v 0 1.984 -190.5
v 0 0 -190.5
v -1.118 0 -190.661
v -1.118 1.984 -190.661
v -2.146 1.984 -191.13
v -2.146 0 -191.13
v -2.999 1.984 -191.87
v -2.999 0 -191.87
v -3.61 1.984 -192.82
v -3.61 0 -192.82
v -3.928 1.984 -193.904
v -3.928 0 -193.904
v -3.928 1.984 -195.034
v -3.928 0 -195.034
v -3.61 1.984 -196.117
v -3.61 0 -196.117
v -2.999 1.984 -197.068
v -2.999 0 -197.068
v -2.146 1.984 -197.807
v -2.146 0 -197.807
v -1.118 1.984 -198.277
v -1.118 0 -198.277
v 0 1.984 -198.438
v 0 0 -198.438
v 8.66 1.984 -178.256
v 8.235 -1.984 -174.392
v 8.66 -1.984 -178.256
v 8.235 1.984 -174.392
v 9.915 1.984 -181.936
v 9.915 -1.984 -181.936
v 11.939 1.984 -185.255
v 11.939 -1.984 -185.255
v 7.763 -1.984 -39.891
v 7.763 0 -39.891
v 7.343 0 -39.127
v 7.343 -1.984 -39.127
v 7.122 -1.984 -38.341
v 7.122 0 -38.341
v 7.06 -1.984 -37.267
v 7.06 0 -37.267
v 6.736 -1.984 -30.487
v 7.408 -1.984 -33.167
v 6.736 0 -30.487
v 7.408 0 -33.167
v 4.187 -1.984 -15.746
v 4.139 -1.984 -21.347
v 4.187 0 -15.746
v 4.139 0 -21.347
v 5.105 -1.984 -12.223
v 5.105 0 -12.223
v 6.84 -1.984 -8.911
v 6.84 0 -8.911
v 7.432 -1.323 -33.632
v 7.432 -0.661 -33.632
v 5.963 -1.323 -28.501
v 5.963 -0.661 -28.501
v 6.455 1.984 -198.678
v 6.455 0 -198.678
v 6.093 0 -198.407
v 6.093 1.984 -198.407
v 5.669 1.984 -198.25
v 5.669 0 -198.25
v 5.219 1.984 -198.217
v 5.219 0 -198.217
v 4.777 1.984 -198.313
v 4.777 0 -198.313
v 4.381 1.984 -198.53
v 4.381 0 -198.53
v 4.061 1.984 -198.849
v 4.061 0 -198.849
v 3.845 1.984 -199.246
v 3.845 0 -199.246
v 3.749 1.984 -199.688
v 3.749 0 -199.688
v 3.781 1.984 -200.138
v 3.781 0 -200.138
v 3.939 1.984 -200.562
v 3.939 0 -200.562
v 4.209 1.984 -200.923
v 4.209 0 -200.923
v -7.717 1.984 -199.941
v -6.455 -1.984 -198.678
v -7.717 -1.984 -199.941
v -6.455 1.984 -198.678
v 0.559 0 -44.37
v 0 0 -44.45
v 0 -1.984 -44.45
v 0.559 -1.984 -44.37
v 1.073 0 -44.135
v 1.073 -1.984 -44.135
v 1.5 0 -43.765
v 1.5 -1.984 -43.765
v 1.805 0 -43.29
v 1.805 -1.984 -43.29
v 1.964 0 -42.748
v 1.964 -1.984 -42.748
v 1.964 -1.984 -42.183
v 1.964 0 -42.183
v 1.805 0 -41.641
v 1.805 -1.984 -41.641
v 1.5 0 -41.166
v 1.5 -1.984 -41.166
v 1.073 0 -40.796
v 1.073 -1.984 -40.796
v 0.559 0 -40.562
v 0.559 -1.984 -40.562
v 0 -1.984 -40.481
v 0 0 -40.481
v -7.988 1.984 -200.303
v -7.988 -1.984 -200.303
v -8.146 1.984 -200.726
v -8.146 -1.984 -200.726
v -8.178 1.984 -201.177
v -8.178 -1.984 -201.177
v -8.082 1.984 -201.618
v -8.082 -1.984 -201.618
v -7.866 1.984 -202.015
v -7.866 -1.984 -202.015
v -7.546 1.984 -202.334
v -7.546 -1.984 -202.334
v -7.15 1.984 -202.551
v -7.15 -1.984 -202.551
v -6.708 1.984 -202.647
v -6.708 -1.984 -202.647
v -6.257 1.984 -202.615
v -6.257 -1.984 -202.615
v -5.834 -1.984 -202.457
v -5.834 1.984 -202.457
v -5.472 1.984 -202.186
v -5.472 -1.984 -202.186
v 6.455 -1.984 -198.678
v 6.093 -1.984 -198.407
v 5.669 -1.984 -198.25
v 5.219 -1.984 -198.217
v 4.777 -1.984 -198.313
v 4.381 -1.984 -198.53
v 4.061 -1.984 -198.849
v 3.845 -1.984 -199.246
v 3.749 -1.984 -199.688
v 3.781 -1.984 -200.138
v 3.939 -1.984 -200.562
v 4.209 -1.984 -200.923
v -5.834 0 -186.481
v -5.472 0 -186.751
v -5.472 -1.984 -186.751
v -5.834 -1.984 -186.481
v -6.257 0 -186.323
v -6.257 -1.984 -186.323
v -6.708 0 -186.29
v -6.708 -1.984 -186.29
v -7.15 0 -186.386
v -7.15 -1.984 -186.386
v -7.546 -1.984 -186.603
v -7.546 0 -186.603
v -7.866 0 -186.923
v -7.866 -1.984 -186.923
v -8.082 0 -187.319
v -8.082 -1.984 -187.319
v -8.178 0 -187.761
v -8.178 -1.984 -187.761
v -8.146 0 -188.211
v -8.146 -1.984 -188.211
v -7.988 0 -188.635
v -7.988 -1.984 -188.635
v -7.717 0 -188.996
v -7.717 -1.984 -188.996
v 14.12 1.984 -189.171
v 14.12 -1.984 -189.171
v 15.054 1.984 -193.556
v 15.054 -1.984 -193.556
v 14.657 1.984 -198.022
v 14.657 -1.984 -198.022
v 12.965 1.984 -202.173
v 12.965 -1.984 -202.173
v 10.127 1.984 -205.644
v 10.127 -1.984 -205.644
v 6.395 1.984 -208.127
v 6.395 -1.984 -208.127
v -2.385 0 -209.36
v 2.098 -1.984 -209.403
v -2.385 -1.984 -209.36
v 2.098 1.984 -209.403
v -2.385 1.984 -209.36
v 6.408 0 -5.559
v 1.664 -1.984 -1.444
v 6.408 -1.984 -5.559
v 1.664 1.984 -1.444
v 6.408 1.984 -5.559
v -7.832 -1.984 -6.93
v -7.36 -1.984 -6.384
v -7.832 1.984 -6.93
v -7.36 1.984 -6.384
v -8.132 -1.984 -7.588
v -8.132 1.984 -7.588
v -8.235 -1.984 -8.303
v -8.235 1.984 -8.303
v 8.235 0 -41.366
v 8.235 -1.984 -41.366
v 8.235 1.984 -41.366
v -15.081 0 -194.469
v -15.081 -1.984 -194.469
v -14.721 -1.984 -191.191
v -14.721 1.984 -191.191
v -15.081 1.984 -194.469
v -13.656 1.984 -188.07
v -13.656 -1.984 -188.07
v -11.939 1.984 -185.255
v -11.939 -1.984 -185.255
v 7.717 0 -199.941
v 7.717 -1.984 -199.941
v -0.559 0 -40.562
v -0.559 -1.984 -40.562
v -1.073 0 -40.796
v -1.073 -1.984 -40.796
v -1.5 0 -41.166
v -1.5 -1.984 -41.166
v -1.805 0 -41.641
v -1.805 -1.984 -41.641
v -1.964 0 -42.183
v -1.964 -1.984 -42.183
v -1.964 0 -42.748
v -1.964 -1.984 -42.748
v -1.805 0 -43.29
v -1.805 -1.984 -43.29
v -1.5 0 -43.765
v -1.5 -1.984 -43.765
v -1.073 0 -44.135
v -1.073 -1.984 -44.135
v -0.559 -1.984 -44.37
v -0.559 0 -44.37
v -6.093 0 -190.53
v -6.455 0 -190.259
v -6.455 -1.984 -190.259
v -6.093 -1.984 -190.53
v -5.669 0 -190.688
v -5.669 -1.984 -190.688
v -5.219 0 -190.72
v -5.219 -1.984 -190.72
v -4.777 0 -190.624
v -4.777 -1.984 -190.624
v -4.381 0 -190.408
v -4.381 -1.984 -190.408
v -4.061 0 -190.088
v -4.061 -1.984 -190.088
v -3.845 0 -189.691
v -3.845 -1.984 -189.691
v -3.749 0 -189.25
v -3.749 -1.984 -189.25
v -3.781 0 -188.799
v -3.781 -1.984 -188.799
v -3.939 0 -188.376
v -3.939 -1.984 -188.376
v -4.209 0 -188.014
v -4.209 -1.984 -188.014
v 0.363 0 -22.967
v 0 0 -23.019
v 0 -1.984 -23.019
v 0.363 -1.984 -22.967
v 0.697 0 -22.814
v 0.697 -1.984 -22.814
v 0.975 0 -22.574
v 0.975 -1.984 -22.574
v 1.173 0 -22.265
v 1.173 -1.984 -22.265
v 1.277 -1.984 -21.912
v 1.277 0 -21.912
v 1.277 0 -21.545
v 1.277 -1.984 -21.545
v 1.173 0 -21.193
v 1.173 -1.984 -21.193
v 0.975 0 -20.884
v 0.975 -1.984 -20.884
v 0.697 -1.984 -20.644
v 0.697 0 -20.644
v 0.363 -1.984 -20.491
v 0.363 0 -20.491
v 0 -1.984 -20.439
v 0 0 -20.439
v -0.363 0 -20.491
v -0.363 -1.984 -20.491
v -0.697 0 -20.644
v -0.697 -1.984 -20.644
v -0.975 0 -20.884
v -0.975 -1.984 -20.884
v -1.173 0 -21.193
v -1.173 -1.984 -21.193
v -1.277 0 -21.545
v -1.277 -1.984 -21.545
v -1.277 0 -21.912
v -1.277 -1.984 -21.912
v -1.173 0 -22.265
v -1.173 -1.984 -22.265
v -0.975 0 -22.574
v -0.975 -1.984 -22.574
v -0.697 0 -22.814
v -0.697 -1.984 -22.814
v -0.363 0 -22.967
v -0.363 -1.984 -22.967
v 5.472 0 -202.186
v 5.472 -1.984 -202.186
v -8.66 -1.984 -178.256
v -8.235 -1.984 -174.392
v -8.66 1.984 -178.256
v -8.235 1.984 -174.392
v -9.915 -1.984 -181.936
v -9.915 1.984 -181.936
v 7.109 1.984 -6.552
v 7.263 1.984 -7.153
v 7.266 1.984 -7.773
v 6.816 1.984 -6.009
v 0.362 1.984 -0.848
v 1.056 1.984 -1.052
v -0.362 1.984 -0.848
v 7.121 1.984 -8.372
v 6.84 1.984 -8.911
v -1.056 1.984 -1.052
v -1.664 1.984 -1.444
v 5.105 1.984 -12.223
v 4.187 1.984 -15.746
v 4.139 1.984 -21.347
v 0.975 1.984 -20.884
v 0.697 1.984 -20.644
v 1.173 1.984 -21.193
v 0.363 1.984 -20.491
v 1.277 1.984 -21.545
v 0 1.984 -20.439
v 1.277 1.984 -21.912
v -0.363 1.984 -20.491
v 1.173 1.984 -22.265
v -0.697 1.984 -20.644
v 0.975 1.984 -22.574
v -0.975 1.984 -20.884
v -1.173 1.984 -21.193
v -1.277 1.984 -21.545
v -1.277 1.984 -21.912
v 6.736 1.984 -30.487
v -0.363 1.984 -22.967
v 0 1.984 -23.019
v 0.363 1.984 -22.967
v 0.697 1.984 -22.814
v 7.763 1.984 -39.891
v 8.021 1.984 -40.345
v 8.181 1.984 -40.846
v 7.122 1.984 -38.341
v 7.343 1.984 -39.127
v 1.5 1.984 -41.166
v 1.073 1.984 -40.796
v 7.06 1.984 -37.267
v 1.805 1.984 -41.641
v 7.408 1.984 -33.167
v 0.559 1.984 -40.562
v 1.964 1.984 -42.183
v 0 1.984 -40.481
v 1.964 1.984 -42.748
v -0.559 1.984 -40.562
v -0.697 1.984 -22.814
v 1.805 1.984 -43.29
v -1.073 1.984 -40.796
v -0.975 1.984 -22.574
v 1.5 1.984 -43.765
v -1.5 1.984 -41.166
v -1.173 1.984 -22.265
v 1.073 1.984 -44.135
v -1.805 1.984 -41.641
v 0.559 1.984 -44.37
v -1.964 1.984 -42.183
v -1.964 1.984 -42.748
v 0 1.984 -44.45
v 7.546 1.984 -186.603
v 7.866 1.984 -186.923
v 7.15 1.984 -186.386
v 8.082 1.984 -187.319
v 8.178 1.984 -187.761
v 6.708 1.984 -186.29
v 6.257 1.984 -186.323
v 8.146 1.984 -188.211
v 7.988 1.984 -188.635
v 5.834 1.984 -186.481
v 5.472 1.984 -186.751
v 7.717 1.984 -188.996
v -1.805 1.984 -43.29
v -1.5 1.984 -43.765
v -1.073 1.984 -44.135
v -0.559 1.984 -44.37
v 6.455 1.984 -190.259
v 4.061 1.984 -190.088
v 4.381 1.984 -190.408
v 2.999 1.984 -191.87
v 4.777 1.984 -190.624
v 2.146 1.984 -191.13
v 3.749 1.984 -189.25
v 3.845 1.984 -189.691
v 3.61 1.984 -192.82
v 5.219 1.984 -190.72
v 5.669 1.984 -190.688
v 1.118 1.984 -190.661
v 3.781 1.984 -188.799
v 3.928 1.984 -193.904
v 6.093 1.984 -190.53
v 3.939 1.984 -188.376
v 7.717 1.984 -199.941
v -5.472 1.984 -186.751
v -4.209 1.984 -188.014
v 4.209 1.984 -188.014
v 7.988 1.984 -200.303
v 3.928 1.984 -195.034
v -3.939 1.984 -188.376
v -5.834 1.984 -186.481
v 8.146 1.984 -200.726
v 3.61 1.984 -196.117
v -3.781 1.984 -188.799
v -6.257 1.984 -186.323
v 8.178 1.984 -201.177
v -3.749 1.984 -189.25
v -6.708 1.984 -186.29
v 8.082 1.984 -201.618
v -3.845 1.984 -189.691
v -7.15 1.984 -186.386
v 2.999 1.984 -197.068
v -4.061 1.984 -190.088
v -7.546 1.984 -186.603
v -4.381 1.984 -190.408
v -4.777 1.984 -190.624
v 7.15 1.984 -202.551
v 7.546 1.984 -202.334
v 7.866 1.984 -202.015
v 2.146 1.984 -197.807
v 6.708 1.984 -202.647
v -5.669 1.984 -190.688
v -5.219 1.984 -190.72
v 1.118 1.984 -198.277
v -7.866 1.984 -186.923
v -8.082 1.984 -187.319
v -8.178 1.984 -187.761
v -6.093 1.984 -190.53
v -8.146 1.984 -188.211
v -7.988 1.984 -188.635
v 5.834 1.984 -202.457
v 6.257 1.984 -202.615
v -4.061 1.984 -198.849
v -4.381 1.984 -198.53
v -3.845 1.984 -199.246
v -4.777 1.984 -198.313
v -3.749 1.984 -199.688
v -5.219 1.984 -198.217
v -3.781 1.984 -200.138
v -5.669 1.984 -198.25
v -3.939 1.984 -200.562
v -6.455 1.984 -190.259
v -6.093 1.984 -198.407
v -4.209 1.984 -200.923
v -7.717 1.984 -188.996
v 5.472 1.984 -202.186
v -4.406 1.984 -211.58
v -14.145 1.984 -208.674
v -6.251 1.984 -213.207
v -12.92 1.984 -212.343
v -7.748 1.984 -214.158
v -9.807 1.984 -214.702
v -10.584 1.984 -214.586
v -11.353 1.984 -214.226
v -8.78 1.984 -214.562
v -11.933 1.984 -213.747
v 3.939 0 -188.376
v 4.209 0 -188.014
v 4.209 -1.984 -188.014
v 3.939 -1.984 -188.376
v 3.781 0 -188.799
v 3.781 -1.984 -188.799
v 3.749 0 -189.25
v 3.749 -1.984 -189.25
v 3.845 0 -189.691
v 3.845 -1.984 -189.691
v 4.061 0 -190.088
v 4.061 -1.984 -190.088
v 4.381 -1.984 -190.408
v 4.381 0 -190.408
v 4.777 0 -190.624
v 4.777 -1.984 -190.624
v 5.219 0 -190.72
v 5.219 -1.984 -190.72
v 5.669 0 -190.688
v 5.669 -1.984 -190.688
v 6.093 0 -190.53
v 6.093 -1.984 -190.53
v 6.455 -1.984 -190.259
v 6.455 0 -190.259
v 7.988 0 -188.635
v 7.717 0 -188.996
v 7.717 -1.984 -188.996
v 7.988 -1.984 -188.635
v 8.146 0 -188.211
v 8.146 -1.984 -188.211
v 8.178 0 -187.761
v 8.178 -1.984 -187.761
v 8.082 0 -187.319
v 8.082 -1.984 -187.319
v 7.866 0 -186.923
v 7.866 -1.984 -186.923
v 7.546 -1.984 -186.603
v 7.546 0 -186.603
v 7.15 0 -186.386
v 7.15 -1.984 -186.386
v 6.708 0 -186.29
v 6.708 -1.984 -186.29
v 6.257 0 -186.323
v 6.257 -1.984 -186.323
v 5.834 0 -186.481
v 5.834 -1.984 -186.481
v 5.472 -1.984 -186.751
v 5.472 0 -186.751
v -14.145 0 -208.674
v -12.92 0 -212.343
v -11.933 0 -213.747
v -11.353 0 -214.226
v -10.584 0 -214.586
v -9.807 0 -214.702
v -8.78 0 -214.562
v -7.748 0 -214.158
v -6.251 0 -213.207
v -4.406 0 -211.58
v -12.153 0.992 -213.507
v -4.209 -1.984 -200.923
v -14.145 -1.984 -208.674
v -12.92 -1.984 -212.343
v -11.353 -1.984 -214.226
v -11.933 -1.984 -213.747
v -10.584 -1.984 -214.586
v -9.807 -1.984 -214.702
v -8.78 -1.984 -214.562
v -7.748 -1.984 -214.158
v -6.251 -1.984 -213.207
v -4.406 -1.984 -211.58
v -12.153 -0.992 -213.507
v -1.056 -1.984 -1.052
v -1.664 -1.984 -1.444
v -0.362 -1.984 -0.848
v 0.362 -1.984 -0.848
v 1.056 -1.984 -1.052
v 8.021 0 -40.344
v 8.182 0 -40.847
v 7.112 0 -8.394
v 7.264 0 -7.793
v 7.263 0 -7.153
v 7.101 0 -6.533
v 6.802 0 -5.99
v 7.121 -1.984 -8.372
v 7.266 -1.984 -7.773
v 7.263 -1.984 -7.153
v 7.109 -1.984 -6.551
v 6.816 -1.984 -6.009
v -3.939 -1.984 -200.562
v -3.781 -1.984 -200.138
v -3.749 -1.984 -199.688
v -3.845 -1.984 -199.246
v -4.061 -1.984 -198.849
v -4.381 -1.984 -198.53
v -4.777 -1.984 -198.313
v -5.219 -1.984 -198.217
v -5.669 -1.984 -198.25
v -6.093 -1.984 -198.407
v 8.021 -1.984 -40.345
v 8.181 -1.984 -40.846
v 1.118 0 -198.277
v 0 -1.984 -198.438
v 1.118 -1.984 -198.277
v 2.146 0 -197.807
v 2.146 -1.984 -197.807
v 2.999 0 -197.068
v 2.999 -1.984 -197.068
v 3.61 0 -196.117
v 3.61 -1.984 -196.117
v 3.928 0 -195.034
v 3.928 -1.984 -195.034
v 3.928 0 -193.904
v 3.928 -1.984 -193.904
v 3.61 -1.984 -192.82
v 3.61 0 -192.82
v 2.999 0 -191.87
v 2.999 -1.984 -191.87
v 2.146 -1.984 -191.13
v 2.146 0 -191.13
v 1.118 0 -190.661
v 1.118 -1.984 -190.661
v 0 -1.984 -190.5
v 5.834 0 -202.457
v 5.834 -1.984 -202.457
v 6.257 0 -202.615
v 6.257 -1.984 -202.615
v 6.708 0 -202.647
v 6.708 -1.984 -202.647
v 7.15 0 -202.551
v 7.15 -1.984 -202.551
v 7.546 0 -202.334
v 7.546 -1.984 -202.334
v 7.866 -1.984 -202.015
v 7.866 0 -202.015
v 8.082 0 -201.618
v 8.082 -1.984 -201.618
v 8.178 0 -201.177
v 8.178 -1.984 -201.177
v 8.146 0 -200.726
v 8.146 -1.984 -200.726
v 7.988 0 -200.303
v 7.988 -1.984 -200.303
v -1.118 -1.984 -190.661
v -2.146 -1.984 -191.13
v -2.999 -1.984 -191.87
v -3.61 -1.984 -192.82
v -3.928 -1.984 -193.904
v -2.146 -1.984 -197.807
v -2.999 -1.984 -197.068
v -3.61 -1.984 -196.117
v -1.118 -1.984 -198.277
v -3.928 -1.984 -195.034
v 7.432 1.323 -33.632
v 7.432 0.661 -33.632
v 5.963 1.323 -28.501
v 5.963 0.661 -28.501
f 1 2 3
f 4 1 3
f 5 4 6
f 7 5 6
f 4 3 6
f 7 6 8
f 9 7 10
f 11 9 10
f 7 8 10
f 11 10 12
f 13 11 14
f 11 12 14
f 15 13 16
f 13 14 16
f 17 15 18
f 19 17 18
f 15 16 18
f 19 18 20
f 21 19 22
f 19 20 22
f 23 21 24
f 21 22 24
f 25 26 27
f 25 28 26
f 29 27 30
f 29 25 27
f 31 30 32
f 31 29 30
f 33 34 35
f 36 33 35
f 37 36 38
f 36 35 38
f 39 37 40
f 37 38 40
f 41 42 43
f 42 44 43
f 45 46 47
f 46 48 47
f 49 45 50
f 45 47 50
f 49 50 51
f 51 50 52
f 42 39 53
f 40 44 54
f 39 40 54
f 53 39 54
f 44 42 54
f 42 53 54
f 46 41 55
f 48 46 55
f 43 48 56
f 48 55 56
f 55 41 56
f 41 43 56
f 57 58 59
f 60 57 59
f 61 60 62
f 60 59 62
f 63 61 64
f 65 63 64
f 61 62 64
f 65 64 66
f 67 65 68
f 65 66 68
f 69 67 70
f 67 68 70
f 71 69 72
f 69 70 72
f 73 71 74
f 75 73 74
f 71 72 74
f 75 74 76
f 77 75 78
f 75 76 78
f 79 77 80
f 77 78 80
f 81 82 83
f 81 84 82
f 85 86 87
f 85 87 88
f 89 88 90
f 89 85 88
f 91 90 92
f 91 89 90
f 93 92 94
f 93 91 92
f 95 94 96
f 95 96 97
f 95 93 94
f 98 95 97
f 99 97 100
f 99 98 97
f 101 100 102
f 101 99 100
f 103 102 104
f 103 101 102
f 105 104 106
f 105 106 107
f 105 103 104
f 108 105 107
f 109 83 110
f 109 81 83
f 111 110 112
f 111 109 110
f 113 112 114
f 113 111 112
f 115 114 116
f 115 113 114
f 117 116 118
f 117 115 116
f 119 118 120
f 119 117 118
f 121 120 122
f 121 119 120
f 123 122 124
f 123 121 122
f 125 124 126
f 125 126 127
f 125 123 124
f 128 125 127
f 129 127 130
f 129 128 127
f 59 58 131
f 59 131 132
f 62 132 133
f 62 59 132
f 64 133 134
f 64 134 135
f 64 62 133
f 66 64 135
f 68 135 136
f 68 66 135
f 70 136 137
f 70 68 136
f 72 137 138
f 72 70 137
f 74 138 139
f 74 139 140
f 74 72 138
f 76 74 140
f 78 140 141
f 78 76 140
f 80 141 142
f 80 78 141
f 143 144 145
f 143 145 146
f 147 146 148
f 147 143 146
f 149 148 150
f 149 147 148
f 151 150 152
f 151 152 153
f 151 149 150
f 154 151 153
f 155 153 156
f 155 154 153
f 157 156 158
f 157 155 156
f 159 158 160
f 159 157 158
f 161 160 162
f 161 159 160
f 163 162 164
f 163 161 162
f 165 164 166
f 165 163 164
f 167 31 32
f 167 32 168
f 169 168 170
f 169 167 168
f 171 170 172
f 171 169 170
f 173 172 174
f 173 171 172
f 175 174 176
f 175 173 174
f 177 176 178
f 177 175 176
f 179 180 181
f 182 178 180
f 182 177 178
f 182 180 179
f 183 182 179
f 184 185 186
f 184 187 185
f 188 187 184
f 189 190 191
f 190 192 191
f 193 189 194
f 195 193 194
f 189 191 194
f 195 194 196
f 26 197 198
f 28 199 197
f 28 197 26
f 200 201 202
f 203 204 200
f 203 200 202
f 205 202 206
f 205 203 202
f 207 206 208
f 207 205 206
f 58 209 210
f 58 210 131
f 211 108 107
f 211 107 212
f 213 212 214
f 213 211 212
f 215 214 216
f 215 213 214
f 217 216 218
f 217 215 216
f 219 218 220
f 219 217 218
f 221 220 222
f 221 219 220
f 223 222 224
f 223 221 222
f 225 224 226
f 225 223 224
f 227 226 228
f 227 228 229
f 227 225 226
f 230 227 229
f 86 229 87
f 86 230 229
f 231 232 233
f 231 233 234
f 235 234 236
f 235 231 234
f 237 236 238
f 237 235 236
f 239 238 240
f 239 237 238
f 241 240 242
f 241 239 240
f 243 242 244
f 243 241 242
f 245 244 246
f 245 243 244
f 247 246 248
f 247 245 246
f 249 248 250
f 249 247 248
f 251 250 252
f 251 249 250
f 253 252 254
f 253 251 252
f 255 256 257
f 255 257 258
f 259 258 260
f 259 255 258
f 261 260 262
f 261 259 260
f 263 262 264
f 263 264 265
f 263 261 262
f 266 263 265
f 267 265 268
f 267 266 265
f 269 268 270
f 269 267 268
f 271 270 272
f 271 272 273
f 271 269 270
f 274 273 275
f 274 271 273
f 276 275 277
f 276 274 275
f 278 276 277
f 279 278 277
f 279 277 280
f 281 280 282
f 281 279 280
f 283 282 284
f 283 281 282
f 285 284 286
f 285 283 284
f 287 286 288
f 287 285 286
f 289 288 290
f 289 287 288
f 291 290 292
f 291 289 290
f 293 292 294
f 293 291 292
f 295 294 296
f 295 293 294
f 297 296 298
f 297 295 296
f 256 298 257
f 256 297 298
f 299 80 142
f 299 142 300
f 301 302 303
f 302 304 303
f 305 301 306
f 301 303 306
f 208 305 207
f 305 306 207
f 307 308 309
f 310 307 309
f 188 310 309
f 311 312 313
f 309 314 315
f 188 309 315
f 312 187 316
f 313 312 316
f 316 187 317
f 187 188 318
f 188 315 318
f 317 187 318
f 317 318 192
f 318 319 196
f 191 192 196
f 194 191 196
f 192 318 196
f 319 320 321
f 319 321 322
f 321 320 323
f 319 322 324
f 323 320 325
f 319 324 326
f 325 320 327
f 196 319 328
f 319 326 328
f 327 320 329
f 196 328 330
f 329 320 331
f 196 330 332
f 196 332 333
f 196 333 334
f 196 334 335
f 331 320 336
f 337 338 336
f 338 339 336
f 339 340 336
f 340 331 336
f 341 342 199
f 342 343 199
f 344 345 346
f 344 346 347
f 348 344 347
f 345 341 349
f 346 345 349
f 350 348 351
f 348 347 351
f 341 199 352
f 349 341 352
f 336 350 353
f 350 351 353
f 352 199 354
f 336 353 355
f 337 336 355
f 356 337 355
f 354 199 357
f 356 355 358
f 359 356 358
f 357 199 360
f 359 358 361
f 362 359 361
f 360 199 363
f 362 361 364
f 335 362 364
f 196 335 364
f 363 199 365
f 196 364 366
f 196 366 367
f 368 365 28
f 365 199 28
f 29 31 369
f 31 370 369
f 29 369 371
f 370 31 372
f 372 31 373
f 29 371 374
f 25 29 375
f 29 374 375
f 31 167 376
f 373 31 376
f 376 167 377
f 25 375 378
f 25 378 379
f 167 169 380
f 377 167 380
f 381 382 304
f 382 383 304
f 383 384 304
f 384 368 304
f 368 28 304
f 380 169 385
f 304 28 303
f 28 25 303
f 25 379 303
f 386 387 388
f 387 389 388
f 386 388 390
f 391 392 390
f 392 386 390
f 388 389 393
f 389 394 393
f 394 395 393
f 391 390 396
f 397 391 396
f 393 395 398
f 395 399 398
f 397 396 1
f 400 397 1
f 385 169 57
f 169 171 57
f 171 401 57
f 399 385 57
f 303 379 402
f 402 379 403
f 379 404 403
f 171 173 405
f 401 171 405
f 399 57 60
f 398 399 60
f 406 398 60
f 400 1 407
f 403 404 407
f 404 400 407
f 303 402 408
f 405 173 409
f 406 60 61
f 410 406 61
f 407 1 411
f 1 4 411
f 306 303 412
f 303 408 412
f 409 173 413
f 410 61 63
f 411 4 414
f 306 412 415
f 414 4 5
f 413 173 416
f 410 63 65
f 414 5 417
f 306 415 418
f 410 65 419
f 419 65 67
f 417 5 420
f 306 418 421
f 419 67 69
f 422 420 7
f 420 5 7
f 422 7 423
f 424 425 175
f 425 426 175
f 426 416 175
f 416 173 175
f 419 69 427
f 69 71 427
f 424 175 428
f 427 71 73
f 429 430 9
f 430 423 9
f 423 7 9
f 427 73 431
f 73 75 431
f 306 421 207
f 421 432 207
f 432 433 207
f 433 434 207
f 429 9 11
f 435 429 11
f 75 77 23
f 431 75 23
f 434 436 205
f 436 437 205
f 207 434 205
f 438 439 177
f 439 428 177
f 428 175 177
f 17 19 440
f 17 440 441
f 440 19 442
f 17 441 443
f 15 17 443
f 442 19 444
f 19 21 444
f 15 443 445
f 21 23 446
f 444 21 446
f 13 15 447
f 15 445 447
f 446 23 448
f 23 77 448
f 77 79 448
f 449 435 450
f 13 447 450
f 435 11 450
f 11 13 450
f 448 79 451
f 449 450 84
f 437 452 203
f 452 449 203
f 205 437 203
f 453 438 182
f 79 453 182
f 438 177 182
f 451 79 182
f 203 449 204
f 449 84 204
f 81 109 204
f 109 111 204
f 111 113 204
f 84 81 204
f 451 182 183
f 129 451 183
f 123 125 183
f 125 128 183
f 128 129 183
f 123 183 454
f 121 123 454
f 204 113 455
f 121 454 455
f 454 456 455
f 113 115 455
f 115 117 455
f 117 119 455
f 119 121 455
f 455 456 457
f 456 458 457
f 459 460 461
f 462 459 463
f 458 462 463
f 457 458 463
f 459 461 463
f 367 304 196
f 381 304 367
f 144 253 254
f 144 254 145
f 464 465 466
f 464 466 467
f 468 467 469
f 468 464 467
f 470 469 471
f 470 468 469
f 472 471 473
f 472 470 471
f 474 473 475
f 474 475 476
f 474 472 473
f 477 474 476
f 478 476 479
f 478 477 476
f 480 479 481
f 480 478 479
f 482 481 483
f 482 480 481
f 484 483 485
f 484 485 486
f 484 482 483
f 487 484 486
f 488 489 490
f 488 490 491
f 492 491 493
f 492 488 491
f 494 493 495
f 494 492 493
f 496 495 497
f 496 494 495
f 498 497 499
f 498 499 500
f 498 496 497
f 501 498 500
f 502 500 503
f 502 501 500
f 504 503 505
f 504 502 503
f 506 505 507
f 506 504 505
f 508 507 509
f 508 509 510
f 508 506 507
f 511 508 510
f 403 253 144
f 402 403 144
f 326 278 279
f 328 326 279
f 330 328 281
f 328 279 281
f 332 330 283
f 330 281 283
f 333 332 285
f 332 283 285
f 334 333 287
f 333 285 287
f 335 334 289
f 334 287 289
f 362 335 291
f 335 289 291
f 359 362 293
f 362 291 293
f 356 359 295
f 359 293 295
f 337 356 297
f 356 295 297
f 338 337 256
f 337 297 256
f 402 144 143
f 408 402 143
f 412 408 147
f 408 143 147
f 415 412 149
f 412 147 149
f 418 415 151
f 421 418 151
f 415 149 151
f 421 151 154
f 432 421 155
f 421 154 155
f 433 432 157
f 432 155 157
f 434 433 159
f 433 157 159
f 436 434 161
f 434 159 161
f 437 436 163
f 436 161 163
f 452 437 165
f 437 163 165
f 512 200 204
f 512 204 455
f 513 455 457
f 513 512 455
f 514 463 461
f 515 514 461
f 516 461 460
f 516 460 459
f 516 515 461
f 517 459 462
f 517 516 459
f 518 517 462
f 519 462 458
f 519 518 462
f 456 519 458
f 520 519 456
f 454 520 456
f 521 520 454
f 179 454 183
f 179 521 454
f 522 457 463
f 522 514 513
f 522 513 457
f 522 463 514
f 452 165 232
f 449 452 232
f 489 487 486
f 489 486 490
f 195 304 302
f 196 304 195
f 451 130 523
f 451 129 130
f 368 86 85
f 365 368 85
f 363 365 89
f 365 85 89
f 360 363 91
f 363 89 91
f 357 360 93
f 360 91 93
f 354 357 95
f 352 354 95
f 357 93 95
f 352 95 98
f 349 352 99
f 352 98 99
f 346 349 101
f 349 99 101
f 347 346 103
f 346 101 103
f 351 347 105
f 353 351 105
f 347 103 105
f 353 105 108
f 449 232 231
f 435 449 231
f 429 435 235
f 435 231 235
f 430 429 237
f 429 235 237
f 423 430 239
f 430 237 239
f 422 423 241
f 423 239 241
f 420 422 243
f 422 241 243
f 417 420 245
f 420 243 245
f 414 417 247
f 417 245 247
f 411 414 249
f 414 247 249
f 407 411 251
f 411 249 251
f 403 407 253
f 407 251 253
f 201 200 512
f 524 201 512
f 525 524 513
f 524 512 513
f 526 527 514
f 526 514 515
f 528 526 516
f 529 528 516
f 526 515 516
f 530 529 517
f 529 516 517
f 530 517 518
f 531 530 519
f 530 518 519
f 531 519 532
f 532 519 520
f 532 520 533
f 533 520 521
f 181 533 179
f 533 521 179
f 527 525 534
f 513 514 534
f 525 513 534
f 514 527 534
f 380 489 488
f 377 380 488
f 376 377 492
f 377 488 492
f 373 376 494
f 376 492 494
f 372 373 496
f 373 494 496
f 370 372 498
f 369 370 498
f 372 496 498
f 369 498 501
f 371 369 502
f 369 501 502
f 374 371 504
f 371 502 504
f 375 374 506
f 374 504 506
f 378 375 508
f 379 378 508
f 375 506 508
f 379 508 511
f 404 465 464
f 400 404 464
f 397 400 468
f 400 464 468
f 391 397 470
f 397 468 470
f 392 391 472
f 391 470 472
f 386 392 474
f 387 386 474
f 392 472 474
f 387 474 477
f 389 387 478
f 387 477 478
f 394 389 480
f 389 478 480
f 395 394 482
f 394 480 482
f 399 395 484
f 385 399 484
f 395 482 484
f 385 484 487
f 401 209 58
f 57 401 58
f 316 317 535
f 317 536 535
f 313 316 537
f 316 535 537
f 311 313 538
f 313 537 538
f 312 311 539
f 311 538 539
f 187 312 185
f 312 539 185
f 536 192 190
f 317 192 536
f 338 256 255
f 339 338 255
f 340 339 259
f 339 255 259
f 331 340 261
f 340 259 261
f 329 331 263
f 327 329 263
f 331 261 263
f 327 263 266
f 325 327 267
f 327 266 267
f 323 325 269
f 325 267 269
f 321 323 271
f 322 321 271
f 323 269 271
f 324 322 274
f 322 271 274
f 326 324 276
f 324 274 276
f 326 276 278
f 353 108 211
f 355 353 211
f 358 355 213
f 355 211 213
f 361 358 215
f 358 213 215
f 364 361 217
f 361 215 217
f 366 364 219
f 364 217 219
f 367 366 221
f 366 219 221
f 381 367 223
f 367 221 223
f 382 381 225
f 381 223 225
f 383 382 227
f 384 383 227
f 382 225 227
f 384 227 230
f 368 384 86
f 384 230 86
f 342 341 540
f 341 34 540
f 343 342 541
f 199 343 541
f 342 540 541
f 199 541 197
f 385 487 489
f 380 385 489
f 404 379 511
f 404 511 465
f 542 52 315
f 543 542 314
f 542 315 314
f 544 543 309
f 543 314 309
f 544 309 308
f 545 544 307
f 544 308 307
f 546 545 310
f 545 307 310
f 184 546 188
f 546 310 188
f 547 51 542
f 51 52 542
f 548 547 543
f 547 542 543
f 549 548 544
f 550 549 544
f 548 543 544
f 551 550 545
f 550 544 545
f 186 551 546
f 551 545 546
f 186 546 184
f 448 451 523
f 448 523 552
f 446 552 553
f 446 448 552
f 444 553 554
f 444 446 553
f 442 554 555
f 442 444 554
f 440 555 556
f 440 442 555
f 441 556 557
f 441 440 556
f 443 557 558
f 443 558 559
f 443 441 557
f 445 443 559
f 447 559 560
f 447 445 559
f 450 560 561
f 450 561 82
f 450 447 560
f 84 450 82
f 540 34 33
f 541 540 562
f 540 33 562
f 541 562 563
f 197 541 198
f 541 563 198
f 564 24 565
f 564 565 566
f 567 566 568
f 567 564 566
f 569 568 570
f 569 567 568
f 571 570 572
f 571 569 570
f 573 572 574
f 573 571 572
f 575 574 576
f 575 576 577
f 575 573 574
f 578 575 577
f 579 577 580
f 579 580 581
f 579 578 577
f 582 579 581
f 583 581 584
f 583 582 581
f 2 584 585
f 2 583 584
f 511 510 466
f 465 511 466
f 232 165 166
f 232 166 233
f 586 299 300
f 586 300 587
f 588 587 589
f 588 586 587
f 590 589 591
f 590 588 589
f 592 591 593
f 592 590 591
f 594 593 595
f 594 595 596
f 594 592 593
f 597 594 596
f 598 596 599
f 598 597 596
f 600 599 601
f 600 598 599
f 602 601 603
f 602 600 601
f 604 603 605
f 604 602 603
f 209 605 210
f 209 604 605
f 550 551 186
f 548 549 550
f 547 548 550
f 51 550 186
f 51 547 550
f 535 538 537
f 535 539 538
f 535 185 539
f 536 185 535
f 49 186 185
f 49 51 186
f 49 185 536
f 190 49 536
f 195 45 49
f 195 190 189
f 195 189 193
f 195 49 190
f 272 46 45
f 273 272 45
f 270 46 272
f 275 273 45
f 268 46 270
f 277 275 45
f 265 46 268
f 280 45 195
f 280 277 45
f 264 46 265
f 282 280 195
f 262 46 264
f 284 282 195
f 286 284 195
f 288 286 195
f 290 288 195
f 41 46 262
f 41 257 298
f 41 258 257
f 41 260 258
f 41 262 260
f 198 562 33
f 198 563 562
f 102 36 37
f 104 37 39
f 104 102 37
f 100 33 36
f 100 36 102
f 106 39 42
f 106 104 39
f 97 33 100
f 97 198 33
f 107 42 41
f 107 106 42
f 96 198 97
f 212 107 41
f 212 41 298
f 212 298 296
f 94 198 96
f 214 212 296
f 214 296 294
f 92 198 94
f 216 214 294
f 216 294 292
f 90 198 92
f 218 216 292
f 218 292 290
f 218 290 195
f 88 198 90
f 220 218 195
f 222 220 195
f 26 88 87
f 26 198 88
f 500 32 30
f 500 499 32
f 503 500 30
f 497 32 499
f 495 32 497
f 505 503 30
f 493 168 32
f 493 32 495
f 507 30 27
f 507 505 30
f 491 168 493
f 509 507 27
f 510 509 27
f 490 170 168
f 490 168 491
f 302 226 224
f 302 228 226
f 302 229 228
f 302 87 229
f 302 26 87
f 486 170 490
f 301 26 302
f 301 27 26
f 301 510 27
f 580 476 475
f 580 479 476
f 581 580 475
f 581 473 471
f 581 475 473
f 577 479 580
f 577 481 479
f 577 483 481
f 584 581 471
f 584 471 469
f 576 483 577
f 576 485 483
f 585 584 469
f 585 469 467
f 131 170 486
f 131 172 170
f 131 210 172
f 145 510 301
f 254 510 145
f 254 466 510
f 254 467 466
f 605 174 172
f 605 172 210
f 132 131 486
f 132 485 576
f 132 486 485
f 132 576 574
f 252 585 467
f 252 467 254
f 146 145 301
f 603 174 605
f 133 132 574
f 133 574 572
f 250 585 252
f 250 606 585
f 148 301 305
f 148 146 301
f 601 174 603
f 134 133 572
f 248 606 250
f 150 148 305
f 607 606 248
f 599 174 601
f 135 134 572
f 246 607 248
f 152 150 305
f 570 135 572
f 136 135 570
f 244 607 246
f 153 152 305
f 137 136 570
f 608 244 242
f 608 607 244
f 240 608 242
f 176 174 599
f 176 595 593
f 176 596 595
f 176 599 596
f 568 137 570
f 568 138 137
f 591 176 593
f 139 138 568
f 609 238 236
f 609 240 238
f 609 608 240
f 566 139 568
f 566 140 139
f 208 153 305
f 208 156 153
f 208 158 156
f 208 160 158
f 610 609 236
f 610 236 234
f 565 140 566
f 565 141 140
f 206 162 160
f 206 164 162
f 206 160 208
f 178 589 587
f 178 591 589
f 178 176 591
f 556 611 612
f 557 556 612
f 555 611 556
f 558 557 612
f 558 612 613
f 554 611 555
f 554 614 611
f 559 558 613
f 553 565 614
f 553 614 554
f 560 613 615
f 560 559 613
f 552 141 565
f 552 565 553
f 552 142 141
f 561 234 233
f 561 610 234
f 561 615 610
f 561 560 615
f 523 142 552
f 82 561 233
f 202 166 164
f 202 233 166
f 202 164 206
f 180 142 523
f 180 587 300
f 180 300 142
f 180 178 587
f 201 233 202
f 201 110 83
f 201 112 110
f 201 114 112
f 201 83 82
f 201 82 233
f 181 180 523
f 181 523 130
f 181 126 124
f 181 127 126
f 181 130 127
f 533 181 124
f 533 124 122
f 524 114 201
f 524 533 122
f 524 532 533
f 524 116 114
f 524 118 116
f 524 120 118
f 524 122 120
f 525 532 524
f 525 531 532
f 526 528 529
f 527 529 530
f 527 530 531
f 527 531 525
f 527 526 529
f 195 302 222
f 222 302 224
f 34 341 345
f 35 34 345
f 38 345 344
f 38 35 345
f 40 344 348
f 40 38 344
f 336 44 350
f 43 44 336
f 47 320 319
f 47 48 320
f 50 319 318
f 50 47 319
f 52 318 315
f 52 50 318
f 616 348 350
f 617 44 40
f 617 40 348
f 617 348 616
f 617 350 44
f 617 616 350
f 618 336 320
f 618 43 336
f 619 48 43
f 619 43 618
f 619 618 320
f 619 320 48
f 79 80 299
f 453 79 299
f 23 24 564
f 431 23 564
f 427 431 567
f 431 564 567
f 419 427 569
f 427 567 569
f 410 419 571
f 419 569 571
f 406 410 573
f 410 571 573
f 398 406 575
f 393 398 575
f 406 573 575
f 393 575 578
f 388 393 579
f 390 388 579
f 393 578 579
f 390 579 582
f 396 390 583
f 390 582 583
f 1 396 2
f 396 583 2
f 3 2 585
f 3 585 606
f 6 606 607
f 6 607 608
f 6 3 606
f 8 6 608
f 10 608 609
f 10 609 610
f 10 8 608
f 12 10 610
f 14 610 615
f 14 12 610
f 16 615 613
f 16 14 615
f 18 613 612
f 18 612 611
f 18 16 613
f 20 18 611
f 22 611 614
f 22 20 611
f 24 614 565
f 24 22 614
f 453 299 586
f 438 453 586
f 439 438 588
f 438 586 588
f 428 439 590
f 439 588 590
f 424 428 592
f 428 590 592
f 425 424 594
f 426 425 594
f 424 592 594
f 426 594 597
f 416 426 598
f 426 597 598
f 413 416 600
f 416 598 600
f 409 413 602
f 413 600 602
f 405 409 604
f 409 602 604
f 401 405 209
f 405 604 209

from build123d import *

# Parameters (mm, degrees)
BOSS_EXTRUDE1_DEPTH = 1.984375
FILLET1_R           = 17.779999999999998
FILLET3_R           = 2.54


with BuildPart() as part:
    # Sketch1 → Boss-Extrude1 (new, symmetric)
    # profile 1 of 7: a face of its own
    with BuildSketch(Plane(origin=(0, 0, 0), x_dir=(1, 0, 0), z_dir=(0, 1, 0))):
        with BuildLine():
            Line((-8.23515625000002, 7.14375), (0, 7.14375))
            Line((0, 7.14375), (0, 20.43906250000001))
            ThreePointArc((-1.513e-14, 20.43906250000001), (-1.2898437499999995, 21.72890625000001), (-1.567e-14, 23.018750000000008))
            Line((0, 23.018750000000008), (0, 40.48125000000001))
            ThreePointArc((6.485e-14, 40.48125000000001), (-1.984375, 42.46562500000001), (6.445e-14, 44.45000000000001))
            Line((0, 44.45000000000001), (0, 179.38750000000002))
            ThreePointArc((3.455e-13, 179.38750000000002), (-4.295498058784434, 180.01216679408725), (-8.235156249999983, 181.83441966156948))
            Line((-8.235156250000001, 181.83441966156946), (-8.235156250000022, 7.143750000000011))
        make_face()
    # profile 2 of 7: a face of its own
    with BuildSketch(Plane(origin=(0, 0, 0), x_dir=(1, 0, 0), z_dir=(0, 1, 0))):
        with BuildLine():
            Line((0, 20.43906250000001), (0, 7.14375))
            Line((0, 7.14375), (8.23515625000002, 7.14375))
            add(Edge.make_bspline(
                [(8.235156250000017, 40.44394804447435), (6.159687598359963, 38.37781946383395), (8.44847607791561, 34.0776706590483), (3.312171002640199, 23.23056643102504), (2.7641627847252086, 13.194656625268534), (8.23515625000002, 7.143749999999999)],
                knots=[0, 0, 0, 0, 0.20223780839821387, 0.3558357267481405, 1, 1, 1, 1], degree=3))
            Line((8.235156250000017, 40.443948044474354), (8.235156250000001, 181.83441966156946))
            ThreePointArc((8.23515624999998, 181.83441966156948), (4.295498058784762, 180.01216679408734), (3.455e-13, 179.38750000000002))
            Line((0, 179.38750000000002), (0, 44.45000000000001))
            ThreePointArc((6.445e-14, 44.45000000000001), (1.4031650189170781, 43.86879001891704), (1.984375, 42.46562500000001))
            ThreePointArc((1.984375, 42.46562500000001), (1.4031650189170788, 41.06245998108298), (6.485e-14, 40.48125000000001))
            Line((0, 40.48125000000001), (0, 23.018750000000008))
            ThreePointArc((-1.567e-14, 23.018750000000008), (0.9120572622960801, 22.6409635122961), (1.2898437499999995, 21.72890625000001))
            ThreePointArc((1.2898437499999995, 21.72890625000001), (0.9120572622960798, 20.816848987703917), (-1.513e-14, 20.43906250000001))
        make_face()
    # profile 3 of 7: a face of its own
    with BuildSketch(Plane(origin=(0, 0, 0), x_dir=(1, 0, 0), z_dir=(0, 1, 0))):
        Polygon((-8.23515625000002, 7.14375), (0, -8.9e-16), (0, 7.14375), align=None)
    # profile 4 of 7: a face of its own
    with BuildSketch(Plane(origin=(0, 0, 0), x_dir=(1, 0, 0), z_dir=(0, 1, 0))):
        Polygon((0, 7.14375), (0, 0), (8.23515625000002, 7.14375), align=None)
    # profile 5 of 7: a face of its own
    with BuildSketch(Plane(origin=(0, 0, 0), x_dir=(1, 0, 0), z_dir=(0, 1, 0))):
        with BuildLine():
            ThreePointArc((-15.081249999999988, 194.46875), (-13.259723823628677, 187.2837777882518), (-8.235156249999983, 181.83441966156948))
            ThreePointArc((-8.235156249999983, 181.83441966156948), (-4.295498058784434, 180.01216679408725), (3.455e-13, 179.38750000000002))
            Line((0, 179.38750000000002), (0, 190.5))
            ThreePointArc((3.1e-14, 190.5), (-3.96874999999999, 194.46875), (3.197e-14, 198.4375))
            Line((0, 198.4375), (0, 209.54999999999998))
            ThreePointArc((9.2e-16, 209.54999999999998), (-1.1963495653314102, 209.50247373299547), (-2.3851589030460536, 209.3601944755947))
            ThreePointArc((-2.3851589030460536, 209.3601944755947), (-11.476394888401645, 204.2532511077708), (-15.081249999999988, 194.46875))
        make_face()
        with BuildLine():
            Line((-7.717407604043602, 188.99640642622387), (-6.454559087018252, 190.25925494324918))
            ThreePointArc((-6.45455908701825, 190.25925494324918), (-4.209495056750905, 190.25925494324918), (-4.20949505675094, 188.01419091298183))
            Line((-4.209495056750945, 188.01419091298183), (-5.472343573776267, 186.7513423959565))
            ThreePointArc((-5.472343573776268, 186.7513423959565), (-7.717407604043627, 186.75134239595653), (-7.717407604043606, 188.99640642622387))
        make_face(mode=Mode.SUBTRACT)
        with BuildLine():
            Line((-5.472343573776115, 202.1861576040435), (-4.209495056750815, 200.92330908701817))
            ThreePointArc((-4.209495056750815, 200.92330908701817), (-4.209495056750835, 198.67824505675082), (-6.454559087018169, 198.67824505675088))
            Line((-6.454559087018169, 198.67824505675088), (-7.717407604043481, 199.94109357377621))
            ThreePointArc((-7.717407604043492, 199.94109357377621), (-7.717407604043447, 202.18615760404353), (-5.472343573776121, 202.1861576040435))
        make_face(mode=Mode.SUBTRACT)
    # profile 6 of 7: a face of its own
    with BuildSketch(Plane(origin=(0, 0, 0), x_dir=(1, 0, 0), z_dir=(0, 1, 0))):
        with BuildLine():
            Line((0, 190.5), (0, 179.38750000000002))
            ThreePointArc((3.455e-13, 179.38750000000002), (4.295498058784762, 180.01216679408734), (8.23515624999998, 181.83441966156948))
            ThreePointArc((8.23515624999998, 181.83441966156948), (13.259723823628674, 187.2837777882518), (15.081249999999988, 194.46875))
            ThreePointArc((15.081249999999988, 194.46875), (10.664054143769611, 205.13280414376962), (9.2e-16, 209.54999999999998))
            Line((0, 209.54999999999998), (0, 198.4375))
            ThreePointArc((3.197e-14, 198.4375), (2.8063300378341145, 197.2750800378341), (3.96874999999999, 194.46875))
            ThreePointArc((3.96874999999999, 194.46875), (2.806330037834115, 191.6624199621659), (3.1e-14, 190.5))
        make_face()
        with BuildLine():
            ThreePointArc((4.209495056750873, 188.0141909129818), (4.209495056750863, 190.25925494324915), (6.454559087018207, 190.25925494324912))
            Line((6.454559087018202, 190.25925494324912), (7.717407604043522, 188.99640642622379))
            ThreePointArc((7.717407604043532, 188.99640642622379), (7.717407604043521, 186.75134239595644), (5.472343573776178, 186.75134239595644))
            Line((5.472343573776174, 186.75134239595644), (4.209495056750864, 188.0141909129818))
        make_face(mode=Mode.SUBTRACT)
        with BuildLine():
            Line((7.717407604043602, 199.9410935737761), (6.454559087018252, 198.6782450567508))
            ThreePointArc((6.454559087018261, 198.6782450567508), (4.209495056750886, 198.67824505675077), (4.209495056750962, 200.92330908701814))
            Line((4.209495056750945, 200.92330908701817), (5.472343573776294, 202.18615760404347))
            ThreePointArc((5.472343573776303, 202.18615760404347), (7.7174076040436335, 202.18615760404342), (7.717407604043618, 199.94109357377607))
        make_face(mode=Mode.SUBTRACT)
    # profile 7 of 7: a face of its own
    with BuildSketch(Plane(origin=(0, 0, 0), x_dir=(1, 0, 0), z_dir=(0, 1, 0))):
        with BuildLine():
            add(Edge.make_bspline(
                [(-15.081249999999988, 194.46875), (-15.572644055765616, 225.099567963449), (-2.385158903046056, 209.3601944755947)],
                knots=[0, 0, 0, 1, 1, 1], degree=2))
            ThreePointArc((-15.081249999999988, 194.46875), (-11.476394888401645, 204.2532511077708), (-2.3851589030460536, 209.3601944755947))
        make_face()
    extrude(amount=BOSS_EXTRUDE1_DEPTH, both=True)

    # Fillet1
    fillet1_edges = [part.edges().sort_by_distance(p)[0] for p in [
        (-8.235156249999992, 0, -181.83441966156948),
        (8.235156249999992, 0, -181.83441966156948),
    ]]
    fillet(fillet1_edges, radius=FILLET1_R)

    # Fillet3
    fillet3_edges = [part.edges().sort_by_distance(p)[0] for p in [
        (8.235156250000017, -0.9921875, -40.443948044474354),
        (-8.23515625000002, 0, -7.143750000000006),
        (0, 0, 4.4e-16),
        (8.23515625000002, 0.9921875, -7.143749999999999),
    ]]
    fillet(fillet3_edges, radius=FILLET3_R)


solid = part.part
